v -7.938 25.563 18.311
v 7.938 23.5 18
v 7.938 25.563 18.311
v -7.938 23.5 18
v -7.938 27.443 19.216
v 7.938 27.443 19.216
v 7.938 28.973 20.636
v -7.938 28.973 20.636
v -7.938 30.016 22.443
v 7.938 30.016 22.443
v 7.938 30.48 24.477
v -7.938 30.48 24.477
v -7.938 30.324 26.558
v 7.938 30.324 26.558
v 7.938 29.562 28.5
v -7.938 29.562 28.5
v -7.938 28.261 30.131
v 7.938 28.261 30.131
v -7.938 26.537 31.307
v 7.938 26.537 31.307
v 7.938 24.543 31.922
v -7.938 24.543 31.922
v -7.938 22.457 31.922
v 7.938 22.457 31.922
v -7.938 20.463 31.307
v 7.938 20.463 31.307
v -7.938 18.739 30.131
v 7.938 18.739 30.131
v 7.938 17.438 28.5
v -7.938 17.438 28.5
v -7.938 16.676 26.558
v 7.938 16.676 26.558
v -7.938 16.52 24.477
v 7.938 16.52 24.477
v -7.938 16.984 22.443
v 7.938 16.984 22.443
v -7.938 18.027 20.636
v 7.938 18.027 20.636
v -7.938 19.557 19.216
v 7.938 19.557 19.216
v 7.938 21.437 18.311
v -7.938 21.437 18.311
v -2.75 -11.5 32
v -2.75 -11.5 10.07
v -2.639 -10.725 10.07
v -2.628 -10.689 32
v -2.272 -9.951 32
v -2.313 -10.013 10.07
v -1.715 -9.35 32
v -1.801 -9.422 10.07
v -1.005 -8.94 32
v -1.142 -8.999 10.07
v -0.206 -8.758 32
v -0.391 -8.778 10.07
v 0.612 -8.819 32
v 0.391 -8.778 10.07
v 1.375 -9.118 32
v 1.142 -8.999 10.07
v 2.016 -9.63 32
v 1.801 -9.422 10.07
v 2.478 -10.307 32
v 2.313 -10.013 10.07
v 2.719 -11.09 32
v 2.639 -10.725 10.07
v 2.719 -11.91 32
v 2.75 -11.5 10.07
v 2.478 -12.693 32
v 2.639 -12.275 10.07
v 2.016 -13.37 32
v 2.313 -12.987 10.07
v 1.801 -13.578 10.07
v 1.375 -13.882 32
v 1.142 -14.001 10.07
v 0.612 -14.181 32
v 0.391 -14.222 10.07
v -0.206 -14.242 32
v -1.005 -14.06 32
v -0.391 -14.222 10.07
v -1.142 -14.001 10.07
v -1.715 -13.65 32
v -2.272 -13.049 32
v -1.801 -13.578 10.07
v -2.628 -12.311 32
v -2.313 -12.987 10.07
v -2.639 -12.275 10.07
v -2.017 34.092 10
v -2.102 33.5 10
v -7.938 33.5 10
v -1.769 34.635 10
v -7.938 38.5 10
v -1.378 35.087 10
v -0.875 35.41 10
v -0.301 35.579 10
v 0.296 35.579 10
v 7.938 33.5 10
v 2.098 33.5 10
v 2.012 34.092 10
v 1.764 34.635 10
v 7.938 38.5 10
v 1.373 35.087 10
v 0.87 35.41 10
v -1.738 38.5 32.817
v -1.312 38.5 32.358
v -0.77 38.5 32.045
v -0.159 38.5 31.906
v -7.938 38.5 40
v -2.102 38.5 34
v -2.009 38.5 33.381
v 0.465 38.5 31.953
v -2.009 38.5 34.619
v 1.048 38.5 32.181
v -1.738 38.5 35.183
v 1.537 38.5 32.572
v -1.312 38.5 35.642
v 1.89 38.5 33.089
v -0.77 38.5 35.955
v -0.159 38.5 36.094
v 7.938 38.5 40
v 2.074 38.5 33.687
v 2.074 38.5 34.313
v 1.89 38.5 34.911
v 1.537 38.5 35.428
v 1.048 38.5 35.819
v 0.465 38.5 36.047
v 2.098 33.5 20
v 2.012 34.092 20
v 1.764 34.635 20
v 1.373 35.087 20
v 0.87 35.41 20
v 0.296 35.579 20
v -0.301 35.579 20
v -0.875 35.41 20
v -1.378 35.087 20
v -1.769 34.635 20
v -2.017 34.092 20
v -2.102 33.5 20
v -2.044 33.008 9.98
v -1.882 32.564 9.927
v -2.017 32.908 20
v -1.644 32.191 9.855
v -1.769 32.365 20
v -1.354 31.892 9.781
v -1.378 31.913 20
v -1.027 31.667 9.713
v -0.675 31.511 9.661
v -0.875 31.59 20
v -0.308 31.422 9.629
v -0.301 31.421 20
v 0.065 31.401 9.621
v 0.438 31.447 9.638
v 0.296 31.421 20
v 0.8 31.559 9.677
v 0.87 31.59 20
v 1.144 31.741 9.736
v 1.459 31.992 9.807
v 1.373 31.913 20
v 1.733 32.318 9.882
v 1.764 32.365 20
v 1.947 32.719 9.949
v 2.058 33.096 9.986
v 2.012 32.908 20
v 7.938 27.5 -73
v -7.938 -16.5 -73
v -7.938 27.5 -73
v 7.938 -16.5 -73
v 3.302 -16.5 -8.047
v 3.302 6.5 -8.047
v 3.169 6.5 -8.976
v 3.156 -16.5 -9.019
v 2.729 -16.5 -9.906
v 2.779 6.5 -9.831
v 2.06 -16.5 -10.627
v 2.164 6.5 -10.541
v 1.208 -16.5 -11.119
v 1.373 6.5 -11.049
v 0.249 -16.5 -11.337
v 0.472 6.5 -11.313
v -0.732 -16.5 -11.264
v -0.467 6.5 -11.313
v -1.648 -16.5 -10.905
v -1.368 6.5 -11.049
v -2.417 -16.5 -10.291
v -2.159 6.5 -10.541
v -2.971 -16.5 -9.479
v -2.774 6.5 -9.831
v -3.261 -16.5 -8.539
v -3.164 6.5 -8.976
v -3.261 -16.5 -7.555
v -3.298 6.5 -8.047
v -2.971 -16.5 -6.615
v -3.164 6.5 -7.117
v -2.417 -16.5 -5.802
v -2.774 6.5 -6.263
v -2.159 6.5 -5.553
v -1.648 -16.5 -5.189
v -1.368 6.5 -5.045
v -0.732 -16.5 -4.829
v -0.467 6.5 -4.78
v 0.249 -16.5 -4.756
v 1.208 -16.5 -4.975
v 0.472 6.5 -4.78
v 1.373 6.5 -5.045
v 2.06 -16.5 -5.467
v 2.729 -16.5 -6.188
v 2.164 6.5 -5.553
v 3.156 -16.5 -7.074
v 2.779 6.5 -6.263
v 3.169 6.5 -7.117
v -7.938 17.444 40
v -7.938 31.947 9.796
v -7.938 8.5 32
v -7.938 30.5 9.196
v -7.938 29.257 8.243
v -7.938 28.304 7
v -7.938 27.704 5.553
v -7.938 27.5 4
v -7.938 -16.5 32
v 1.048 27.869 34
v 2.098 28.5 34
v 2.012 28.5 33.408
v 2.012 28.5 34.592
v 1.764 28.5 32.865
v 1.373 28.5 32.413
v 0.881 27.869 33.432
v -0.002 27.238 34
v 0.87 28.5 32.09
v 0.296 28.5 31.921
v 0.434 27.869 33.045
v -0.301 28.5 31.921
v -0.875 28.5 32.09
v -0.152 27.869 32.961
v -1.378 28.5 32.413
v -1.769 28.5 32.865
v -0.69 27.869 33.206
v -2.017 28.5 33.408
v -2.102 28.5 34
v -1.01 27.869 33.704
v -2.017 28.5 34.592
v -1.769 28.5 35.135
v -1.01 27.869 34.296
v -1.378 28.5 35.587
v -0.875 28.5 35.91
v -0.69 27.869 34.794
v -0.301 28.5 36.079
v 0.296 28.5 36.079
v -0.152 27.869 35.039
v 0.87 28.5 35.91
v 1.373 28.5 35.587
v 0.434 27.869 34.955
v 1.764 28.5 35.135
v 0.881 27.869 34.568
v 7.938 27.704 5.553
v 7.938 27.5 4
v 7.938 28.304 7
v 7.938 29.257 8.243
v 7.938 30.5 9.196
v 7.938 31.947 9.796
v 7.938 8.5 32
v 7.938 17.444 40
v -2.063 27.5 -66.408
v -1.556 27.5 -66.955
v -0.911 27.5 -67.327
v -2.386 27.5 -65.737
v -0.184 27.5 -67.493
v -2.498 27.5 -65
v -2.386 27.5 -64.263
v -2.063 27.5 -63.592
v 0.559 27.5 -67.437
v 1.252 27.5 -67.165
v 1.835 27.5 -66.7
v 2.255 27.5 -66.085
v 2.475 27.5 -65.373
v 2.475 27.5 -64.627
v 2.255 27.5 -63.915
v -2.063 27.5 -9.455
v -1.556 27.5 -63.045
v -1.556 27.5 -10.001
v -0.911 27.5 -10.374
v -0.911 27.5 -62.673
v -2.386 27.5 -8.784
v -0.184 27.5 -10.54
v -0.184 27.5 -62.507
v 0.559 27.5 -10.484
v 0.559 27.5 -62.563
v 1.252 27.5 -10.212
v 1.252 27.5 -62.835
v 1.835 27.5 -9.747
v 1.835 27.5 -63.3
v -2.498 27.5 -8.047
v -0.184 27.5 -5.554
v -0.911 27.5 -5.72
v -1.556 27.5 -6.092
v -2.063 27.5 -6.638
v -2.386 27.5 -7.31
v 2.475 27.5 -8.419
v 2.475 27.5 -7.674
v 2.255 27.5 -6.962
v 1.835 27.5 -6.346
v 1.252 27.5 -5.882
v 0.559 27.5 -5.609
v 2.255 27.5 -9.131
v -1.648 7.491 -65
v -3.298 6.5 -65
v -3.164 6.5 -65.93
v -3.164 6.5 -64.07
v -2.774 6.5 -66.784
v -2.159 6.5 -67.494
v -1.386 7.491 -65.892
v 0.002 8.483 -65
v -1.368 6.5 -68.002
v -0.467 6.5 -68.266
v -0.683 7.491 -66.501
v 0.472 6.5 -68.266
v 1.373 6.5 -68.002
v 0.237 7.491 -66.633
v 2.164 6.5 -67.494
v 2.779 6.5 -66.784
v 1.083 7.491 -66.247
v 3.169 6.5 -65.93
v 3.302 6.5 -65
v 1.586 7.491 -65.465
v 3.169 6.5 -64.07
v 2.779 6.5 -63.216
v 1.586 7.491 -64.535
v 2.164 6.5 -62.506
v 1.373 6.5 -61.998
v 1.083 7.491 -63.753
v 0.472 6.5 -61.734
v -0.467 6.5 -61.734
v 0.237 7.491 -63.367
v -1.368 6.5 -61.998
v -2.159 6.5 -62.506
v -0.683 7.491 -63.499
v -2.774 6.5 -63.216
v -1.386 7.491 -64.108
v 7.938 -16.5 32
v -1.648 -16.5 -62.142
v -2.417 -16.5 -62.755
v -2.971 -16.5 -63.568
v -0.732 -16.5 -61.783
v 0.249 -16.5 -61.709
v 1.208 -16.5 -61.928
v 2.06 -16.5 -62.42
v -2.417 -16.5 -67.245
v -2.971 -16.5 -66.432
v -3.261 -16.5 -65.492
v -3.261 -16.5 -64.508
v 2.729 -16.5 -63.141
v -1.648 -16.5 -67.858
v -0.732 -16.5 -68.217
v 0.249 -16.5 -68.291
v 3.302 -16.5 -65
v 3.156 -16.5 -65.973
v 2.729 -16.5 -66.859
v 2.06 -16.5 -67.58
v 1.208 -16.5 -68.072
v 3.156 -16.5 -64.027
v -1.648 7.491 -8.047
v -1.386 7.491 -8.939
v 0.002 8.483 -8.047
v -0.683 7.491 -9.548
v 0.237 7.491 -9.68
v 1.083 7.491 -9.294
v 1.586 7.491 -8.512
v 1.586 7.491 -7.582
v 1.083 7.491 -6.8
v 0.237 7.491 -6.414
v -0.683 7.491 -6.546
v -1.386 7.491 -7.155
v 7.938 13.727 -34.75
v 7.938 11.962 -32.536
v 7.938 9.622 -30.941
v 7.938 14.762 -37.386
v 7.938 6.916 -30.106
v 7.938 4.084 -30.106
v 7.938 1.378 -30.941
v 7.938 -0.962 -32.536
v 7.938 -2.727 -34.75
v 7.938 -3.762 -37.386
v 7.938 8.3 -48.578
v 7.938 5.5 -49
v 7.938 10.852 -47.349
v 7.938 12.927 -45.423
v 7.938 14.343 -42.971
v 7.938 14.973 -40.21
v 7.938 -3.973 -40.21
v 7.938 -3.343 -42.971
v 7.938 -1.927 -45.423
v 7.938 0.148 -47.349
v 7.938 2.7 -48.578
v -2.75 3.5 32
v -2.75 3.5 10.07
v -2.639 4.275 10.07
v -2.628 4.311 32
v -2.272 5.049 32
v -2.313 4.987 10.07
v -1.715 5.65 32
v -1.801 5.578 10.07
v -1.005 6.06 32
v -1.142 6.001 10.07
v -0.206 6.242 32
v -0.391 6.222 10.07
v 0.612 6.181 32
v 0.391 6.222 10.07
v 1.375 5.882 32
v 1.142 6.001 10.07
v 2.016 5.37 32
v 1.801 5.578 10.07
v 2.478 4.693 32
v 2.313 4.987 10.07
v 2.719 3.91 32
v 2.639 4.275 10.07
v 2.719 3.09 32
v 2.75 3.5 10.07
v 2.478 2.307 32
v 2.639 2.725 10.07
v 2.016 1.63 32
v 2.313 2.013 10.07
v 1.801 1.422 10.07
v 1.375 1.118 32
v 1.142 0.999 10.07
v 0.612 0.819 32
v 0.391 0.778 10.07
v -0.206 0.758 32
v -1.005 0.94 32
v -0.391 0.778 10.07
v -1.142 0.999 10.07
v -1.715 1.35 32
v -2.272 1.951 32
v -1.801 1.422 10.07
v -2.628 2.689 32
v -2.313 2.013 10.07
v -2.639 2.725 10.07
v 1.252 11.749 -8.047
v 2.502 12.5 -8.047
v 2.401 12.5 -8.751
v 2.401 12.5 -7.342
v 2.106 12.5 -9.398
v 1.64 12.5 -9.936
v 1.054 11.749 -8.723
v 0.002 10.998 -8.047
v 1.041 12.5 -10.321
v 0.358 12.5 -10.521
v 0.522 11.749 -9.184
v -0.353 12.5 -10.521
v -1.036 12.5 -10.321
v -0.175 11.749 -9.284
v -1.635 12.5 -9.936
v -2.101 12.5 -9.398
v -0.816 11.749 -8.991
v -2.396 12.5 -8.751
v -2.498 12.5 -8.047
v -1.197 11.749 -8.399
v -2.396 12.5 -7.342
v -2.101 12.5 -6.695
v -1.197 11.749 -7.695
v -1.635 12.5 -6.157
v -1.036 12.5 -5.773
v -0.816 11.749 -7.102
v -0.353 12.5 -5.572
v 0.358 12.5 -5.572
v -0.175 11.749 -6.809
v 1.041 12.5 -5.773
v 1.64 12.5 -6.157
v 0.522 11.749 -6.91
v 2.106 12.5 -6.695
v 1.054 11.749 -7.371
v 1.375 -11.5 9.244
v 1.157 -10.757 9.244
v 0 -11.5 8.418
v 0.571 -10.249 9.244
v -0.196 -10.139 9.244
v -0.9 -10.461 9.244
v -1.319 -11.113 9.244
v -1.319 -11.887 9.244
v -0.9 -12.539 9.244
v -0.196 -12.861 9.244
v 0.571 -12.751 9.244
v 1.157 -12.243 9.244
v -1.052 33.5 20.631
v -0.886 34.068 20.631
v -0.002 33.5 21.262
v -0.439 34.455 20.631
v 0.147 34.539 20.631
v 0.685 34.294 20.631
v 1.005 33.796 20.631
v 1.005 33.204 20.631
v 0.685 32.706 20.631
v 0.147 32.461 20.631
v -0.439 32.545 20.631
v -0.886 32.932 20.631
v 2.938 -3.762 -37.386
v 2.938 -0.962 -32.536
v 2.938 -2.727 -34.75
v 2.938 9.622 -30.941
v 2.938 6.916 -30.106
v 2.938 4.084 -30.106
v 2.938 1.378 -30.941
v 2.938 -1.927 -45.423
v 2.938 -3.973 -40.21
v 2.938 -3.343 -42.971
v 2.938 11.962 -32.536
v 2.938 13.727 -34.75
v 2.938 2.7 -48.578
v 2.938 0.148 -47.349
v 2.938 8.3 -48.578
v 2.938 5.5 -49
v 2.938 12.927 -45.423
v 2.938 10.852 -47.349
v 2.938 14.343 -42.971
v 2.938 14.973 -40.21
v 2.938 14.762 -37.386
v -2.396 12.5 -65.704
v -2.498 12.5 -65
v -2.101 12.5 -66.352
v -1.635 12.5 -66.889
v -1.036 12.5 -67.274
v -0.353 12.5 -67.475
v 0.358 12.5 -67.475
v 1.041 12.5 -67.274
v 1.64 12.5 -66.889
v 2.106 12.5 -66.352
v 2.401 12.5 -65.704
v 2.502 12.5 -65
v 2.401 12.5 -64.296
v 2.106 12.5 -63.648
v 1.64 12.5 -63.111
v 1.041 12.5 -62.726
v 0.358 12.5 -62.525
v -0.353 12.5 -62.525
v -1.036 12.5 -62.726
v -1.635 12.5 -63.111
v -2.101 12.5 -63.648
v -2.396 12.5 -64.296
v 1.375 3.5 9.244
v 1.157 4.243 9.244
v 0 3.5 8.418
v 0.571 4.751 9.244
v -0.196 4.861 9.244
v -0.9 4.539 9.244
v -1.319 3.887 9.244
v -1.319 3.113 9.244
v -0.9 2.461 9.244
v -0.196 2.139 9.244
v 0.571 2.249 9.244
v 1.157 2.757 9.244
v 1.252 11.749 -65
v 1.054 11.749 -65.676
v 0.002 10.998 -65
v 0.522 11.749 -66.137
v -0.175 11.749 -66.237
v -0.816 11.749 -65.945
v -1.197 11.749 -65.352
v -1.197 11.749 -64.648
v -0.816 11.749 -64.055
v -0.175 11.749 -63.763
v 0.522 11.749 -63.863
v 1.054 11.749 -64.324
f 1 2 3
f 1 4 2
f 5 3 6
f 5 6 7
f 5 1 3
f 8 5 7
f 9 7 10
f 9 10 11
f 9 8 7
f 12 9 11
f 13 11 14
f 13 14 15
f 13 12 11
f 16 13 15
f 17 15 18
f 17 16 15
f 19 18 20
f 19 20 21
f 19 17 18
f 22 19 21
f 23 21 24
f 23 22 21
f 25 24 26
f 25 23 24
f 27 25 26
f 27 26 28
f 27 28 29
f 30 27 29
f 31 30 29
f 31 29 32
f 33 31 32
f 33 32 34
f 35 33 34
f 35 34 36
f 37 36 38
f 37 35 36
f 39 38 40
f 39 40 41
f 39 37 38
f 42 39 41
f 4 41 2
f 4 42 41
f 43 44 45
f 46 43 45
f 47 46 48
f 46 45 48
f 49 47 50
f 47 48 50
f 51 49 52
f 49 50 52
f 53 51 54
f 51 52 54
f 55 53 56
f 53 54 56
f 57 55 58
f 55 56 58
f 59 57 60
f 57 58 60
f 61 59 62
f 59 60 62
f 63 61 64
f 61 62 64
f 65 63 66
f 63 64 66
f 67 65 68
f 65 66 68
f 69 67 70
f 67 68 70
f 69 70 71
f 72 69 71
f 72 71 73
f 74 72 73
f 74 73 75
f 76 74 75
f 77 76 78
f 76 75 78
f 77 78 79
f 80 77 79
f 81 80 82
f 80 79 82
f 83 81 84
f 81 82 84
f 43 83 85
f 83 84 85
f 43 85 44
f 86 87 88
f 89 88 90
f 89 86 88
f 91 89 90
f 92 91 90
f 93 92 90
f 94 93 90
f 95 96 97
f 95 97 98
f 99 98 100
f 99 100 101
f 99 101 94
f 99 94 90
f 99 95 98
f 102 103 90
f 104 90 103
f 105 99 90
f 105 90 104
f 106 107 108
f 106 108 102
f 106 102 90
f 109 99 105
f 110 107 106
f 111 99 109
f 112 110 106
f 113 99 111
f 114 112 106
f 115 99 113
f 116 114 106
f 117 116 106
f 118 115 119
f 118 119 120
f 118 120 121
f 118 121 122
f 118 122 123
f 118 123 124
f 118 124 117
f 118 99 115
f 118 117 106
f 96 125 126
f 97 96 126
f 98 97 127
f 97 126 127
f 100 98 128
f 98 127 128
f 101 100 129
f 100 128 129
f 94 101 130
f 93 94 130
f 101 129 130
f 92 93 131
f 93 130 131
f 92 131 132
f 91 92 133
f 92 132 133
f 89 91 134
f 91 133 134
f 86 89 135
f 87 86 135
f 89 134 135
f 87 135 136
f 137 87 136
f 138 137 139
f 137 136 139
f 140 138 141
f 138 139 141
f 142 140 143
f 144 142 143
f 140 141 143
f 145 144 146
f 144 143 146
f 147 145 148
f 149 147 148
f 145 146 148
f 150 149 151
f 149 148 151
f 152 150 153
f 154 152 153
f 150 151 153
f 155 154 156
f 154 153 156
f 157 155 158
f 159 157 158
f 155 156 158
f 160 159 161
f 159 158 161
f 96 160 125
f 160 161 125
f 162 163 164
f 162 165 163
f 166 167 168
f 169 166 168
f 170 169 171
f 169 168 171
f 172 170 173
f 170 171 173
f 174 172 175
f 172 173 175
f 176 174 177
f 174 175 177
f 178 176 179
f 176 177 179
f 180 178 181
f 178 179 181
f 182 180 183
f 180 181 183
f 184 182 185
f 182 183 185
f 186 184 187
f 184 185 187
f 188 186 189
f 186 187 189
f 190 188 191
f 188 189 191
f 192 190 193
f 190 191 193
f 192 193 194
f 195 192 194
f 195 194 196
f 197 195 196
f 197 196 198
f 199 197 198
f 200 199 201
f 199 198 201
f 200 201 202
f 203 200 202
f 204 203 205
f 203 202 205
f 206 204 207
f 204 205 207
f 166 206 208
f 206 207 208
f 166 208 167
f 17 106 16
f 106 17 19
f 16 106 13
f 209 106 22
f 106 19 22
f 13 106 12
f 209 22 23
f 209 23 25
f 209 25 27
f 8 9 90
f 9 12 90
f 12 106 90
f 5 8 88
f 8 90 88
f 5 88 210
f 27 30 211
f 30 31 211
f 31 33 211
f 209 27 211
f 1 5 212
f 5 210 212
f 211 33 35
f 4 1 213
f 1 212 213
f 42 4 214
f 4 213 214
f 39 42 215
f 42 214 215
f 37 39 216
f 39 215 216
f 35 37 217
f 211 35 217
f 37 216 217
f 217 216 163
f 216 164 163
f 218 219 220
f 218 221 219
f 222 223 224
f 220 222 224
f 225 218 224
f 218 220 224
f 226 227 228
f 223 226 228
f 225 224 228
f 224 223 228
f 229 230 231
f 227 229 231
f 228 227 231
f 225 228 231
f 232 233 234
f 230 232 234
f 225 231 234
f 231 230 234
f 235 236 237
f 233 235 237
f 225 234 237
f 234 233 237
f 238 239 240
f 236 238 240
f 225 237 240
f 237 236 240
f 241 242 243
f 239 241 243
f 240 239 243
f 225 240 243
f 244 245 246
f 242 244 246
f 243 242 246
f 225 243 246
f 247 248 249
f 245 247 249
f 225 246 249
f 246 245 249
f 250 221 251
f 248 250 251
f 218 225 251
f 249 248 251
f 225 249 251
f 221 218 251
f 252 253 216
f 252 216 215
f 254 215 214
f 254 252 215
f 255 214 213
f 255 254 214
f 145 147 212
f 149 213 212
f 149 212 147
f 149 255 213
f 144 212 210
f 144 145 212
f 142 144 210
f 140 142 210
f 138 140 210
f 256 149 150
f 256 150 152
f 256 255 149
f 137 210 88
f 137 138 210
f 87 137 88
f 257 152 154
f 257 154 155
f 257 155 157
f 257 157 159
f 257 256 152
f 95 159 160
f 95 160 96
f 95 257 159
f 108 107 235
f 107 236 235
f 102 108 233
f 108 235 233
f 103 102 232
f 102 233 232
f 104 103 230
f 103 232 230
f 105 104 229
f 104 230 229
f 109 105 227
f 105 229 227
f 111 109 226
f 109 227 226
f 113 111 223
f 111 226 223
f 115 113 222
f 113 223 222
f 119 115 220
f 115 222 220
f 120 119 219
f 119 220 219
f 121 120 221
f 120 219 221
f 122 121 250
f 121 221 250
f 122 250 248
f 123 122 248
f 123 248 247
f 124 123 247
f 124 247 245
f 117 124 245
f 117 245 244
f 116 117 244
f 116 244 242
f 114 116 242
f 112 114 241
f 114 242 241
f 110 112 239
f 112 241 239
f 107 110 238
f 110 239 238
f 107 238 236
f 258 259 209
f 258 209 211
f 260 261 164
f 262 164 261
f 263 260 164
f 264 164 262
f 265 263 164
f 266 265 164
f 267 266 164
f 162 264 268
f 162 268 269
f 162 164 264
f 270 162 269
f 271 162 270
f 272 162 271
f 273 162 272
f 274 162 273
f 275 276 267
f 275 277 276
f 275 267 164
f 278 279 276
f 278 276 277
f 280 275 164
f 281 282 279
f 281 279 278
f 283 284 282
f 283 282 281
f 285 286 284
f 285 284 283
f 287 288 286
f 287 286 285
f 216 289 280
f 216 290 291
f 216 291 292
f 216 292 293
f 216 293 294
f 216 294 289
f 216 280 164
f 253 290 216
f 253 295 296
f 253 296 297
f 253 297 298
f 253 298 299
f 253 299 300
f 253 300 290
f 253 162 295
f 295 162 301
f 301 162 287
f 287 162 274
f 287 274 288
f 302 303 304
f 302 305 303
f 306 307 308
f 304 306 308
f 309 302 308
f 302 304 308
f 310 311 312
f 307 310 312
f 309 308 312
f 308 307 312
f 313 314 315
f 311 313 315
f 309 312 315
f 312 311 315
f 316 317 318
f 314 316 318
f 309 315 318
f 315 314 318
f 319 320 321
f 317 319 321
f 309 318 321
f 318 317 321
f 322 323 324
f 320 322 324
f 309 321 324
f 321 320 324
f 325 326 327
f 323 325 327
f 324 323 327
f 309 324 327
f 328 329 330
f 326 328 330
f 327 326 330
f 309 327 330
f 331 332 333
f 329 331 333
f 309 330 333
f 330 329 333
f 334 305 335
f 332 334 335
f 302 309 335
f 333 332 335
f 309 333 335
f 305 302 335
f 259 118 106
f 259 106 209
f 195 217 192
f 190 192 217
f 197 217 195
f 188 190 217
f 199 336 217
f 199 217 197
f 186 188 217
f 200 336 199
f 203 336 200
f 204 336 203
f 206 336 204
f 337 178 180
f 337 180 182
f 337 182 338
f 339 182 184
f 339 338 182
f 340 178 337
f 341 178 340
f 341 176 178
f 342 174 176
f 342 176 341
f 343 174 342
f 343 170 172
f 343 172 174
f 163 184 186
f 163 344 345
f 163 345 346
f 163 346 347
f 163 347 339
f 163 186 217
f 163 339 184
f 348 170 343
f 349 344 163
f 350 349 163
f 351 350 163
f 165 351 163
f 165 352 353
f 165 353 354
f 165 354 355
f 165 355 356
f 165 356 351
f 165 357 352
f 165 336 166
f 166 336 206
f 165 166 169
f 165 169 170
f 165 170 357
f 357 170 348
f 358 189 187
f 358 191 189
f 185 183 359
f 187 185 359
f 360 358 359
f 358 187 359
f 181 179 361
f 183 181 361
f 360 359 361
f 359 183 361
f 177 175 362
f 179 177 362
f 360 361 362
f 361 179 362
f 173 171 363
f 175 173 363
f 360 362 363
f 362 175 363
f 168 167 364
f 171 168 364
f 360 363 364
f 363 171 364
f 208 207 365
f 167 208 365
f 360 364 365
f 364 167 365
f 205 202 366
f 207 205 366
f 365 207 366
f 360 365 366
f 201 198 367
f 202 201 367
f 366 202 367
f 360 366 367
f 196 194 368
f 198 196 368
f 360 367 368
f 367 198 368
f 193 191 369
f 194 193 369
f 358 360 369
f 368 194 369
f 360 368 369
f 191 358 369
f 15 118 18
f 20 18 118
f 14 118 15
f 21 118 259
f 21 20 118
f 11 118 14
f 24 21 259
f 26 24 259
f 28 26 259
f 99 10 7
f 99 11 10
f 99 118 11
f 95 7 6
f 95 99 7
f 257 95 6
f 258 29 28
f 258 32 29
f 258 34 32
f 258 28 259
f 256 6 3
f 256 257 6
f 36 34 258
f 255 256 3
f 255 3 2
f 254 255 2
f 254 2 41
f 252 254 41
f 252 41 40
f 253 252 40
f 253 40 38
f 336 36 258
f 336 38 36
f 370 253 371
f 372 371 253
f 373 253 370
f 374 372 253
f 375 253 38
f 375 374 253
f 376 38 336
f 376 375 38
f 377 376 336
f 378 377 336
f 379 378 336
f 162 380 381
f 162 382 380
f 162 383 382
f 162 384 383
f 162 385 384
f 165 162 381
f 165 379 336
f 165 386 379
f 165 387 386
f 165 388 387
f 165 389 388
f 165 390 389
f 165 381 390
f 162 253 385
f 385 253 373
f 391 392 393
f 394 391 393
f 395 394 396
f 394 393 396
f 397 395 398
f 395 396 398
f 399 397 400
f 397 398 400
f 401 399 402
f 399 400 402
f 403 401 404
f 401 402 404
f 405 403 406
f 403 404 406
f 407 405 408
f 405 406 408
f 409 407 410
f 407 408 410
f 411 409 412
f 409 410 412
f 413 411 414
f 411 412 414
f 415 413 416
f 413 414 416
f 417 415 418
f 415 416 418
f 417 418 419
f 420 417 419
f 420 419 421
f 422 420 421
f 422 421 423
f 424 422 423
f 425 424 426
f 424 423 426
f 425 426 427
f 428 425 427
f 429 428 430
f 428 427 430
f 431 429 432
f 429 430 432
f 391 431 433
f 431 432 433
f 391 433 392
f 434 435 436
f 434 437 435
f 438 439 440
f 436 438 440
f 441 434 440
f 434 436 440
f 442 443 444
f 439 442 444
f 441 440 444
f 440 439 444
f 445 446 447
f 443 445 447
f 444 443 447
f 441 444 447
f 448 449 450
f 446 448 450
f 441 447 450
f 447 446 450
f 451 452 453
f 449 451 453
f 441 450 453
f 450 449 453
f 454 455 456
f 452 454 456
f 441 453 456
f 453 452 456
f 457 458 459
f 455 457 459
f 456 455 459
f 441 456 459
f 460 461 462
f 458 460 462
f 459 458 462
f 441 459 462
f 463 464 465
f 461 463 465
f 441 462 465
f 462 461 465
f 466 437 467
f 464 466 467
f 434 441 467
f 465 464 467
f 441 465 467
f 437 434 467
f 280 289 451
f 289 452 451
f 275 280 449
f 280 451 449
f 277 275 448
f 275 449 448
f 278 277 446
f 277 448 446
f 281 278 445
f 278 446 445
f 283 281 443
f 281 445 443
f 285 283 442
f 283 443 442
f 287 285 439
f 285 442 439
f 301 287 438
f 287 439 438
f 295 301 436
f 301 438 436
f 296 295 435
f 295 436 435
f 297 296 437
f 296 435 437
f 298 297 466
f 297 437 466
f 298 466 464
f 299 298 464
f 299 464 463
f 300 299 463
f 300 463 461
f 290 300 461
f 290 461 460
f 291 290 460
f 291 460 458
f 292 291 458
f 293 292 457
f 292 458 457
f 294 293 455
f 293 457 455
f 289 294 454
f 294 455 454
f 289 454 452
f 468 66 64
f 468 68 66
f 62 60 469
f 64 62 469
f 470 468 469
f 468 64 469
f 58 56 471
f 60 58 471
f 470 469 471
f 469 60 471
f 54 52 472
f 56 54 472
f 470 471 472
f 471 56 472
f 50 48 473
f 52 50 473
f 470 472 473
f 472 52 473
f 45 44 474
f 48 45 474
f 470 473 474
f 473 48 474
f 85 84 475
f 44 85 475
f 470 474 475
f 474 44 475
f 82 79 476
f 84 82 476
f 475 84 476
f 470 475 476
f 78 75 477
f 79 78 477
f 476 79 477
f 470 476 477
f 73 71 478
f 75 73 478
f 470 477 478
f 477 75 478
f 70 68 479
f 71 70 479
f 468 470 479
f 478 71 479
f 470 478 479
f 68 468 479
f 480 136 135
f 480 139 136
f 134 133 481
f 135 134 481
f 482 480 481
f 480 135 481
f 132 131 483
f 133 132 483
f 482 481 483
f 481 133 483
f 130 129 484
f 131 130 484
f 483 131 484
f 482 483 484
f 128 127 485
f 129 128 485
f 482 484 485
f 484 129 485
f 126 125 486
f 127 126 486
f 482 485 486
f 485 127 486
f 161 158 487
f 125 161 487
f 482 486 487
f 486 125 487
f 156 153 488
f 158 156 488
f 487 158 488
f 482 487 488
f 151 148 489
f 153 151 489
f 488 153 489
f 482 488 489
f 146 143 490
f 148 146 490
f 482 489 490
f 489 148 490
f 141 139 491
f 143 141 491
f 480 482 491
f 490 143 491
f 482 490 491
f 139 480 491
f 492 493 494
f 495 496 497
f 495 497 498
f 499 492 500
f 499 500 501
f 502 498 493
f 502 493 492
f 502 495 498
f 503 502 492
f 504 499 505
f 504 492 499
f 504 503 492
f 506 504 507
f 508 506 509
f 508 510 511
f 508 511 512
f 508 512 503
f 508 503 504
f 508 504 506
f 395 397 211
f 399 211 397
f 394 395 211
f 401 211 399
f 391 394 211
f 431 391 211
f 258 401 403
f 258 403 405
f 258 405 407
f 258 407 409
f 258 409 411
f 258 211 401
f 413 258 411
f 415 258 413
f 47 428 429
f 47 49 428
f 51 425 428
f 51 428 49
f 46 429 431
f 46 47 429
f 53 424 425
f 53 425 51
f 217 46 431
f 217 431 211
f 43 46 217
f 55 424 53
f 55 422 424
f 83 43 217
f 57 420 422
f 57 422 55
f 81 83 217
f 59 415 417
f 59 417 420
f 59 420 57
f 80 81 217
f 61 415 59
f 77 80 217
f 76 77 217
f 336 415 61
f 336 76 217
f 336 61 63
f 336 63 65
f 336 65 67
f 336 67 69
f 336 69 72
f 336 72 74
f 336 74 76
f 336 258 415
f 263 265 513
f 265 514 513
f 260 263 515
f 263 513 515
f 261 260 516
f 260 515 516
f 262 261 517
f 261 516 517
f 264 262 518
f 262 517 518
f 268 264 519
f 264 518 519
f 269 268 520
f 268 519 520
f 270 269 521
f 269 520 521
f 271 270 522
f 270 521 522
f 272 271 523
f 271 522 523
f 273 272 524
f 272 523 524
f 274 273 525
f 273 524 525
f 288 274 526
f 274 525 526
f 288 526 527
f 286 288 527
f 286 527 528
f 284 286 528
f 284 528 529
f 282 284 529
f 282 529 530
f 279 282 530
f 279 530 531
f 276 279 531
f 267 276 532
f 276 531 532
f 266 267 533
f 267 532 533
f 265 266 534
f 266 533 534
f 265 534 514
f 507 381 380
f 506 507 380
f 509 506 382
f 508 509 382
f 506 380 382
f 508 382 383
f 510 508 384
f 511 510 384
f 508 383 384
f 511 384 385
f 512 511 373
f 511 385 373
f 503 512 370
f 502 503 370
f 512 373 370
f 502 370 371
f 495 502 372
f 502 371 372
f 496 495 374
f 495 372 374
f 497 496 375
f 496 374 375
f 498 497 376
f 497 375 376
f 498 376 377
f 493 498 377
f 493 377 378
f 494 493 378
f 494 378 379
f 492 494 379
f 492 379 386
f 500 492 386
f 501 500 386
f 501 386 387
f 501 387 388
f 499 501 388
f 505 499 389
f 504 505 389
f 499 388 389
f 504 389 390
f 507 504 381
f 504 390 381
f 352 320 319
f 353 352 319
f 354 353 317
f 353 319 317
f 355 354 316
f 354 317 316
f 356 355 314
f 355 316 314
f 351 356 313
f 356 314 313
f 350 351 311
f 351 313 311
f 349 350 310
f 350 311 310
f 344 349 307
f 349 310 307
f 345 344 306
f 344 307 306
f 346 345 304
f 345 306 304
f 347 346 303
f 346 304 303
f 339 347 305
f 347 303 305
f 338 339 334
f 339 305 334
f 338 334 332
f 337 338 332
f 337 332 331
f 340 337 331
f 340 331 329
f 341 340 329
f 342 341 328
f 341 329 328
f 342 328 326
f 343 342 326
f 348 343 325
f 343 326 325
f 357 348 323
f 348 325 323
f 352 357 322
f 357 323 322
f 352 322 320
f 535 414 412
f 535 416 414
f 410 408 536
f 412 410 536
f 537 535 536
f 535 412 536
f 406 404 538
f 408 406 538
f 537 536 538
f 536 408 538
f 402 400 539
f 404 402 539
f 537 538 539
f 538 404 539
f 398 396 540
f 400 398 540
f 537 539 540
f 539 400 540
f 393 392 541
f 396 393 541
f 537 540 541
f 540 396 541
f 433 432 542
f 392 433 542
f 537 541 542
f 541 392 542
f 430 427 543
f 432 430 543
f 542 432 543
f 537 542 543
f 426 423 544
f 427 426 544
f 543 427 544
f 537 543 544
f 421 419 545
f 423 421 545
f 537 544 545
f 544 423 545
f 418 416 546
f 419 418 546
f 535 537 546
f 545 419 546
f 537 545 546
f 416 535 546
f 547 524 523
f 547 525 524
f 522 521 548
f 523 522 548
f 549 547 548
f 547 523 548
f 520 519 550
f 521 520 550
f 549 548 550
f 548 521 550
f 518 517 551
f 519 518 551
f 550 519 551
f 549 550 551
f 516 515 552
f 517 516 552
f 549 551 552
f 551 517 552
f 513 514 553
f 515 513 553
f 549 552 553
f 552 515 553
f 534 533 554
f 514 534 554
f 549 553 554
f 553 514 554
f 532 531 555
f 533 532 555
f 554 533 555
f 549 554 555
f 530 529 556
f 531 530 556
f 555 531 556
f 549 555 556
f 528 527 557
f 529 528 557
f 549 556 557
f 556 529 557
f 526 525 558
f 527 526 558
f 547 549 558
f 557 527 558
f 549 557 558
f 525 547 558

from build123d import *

# Parameters (mm, degrees)
ESBO_O1_R                                            = 7
RESSALTO_EXTRUS_O1_DEPTH                             = 7.9375
ESCAREADO_PARA_PARAFUSO_DE_M_QUINA_COM_C_D           = 5.5
ESCAREADO_PARA_PARAFUSO_DE_M_QUINA_COM_C_DEPTH       = 30
ESCAREADO_PARA_PARAFUSO_DE_M_QUINA_COM_C_CSINK_D     = 10.4
ESCAREADO_PARA_PARAFUSO_DE_M_QUINA_COM_C_CSINK_ANGLE = 90
ESCAREADO_PARA_PARAFUSO_DE_M_QUINA_COM_C_TIP         = 1.652366702
ESCAREADO_PARA_PARAFUSO_DE_M_QUINA_C_2_D             = 6.6
ESCAREADO_PARA_PARAFUSO_DE_M_QUINA_C_2_DEPTH         = 30
ESCAREADO_PARA_PARAFUSO_DE_M_QUINA_C_2_CSINK_D       = 12.6
ESCAREADO_PARA_PARAFUSO_DE_M_QUINA_C_2_CSINK_ANGLE   = 90
ESCAREADO_PARA_PARAFUSO_DE_M_QUINA_C_2_TIP           = 1.982840043
BROCA_DE_ROSQUEAR_PARA_TARRAXA_DE_M5X0_8_D           = 4.2
BROCA_DE_ROSQUEAR_PARA_TARRAXA_DE_M5X0_8_DEPTH       = 20
BROCA_DE_ROSQUEAR_PARA_TARRAXA_DE_M5X0_8_TIP         = 1.2618073
BROCA_DE_ROSQUEAR_PARA_TARRAXA_DE_M5_2_D             = 4.2
BROCA_DE_ROSQUEAR_PARA_TARRAXA_DE_M5_2_DEPTH         = 20
BROCA_DE_ROSQUEAR_PARA_TARRAXA_DE_M5_2_TIP           = 1.2618073
BROCA_DE_ROSQUEAR_PARA_TARRAXA_DE_M6X1_0_D           = 5
BROCA_DE_ROSQUEAR_PARA_TARRAXA_DE_M6X1_0_DEPTH       = 15
BROCA_DE_ROSQUEAR_PARA_TARRAXA_DE_M6X1_0_TIP         = 1.502151548
FILLET1_R                                            = 6
SKETCH7_R                                            = 9.5
CUT_EXTRUDE4_DEPTH                                   = 5


with BuildPart() as part:
    # Esboço1 → Ressalto-extrusão1 (new, symmetric)
    with BuildSketch(Plane(origin=(0, 0, 0), x_dir=(0, 0, -1), z_dir=(1, 0, 0))):
        Polygon((-10, 38.5), (-40, 38.5), (-40, 23.5), (-40, 17.44427191), (-32, 8.5), (-32, -16.5), (73, -16.5), (73, 27.5), (-10, 27.5), align=None)
        with Locations((-25, 23.5)):
            Circle(ESBO_O1_R, mode=Mode.SUBTRACT)
    extrude(amount=RESSALTO_EXTRUS_O1_DEPTH, both=True)

    # Escareado para parafuso de m_quina com c
    with Locations(Plane(origin=(33.0625, -10.251665499, 40.070399895), x_dir=(1, 0, 0), z_dir=(0, 0, 1))):
        with Locations((-33.0625, 13.751665499), (-33.0625, -1.248334501), (33.0625, -1.248334501), (33.0625, 13.751665499)):
            CounterSinkHole(ESCAREADO_PARA_PARAFUSO_DE_M_QUINA_COM_C_D / 2, ESCAREADO_PARA_PARAFUSO_DE_M_QUINA_COM_C_CSINK_D / 2, depth=ESCAREADO_PARA_PARAFUSO_DE_M_QUINA_COM_C_DEPTH, counter_sink_angle=ESCAREADO_PARA_PARAFUSO_DE_M_QUINA_COM_C_CSINK_ANGLE)
            with Locations((0, 0, -(ESCAREADO_PARA_PARAFUSO_DE_M_QUINA_COM_C_DEPTH + ESCAREADO_PARA_PARAFUSO_DE_M_QUINA_COM_C_TIP / 2))):  # 118° drill point
                Cone(0, ESCAREADO_PARA_PARAFUSO_DE_M_QUINA_COM_C_D / 2, ESCAREADO_PARA_PARAFUSO_DE_M_QUINA_COM_C_TIP, mode=Mode.SUBTRACT)

    # Escareado para parafuso de m_quina c 2
    with Locations(Plane(origin=(33.0625, -23.5, -11.460196829), x_dir=(-1, 0, 0), z_dir=(0, -1, 0))):
        with Locations((33.06, 53.539803171), (33.06, -3.413475694), (-33.06, -3.413475694), (-33.06, 49.586524306)):
            CounterSinkHole(ESCAREADO_PARA_PARAFUSO_DE_M_QUINA_C_2_D / 2, ESCAREADO_PARA_PARAFUSO_DE_M_QUINA_C_2_CSINK_D / 2, depth=ESCAREADO_PARA_PARAFUSO_DE_M_QUINA_C_2_DEPTH, counter_sink_angle=ESCAREADO_PARA_PARAFUSO_DE_M_QUINA_C_2_CSINK_ANGLE)
            with Locations((0, 0, -(ESCAREADO_PARA_PARAFUSO_DE_M_QUINA_C_2_DEPTH + ESCAREADO_PARA_PARAFUSO_DE_M_QUINA_C_2_TIP / 2))):  # 118° drill point
                Cone(0, ESCAREADO_PARA_PARAFUSO_DE_M_QUINA_C_2_D / 2, ESCAREADO_PARA_PARAFUSO_DE_M_QUINA_C_2_TIP, mode=Mode.SUBTRACT)

    # Broca de rosquear para tarraxa de M5x0.8
    with Locations(Plane(origin=(33.0625, 48.5, -11.460196829), x_dir=(1, 0, 0), z_dir=(0, 1, 0))):
        with Locations((33.06, -45.460196829), (-33.065, -45.460196829)):
            Hole(BROCA_DE_ROSQUEAR_PARA_TARRAXA_DE_M5X0_8_D / 2, depth=BROCA_DE_ROSQUEAR_PARA_TARRAXA_DE_M5X0_8_DEPTH)
            with Locations((0, 0, -(BROCA_DE_ROSQUEAR_PARA_TARRAXA_DE_M5X0_8_DEPTH + BROCA_DE_ROSQUEAR_PARA_TARRAXA_DE_M5X0_8_TIP / 2))):  # 118° drill point
                Cone(0, BROCA_DE_ROSQUEAR_PARA_TARRAXA_DE_M5X0_8_D / 2, BROCA_DE_ROSQUEAR_PARA_TARRAXA_DE_M5X0_8_TIP, mode=Mode.SUBTRACT)

    # Broca de rosquear para tarraxa de M5 2
    with Locations(Plane(origin=(33.0625, -10.251665499, 0), x_dir=(-1, 0, 0), z_dir=(0, 0, -1))):
        with Locations((-33.06, 43.751665499), (33.065, 43.751665499)):
            Hole(BROCA_DE_ROSQUEAR_PARA_TARRAXA_DE_M5_2_D / 2, depth=BROCA_DE_ROSQUEAR_PARA_TARRAXA_DE_M5_2_DEPTH)
            with Locations((0, 0, -(BROCA_DE_ROSQUEAR_PARA_TARRAXA_DE_M5_2_DEPTH + BROCA_DE_ROSQUEAR_PARA_TARRAXA_DE_M5_2_TIP / 2))):  # 118° drill point
                Cone(0, BROCA_DE_ROSQUEAR_PARA_TARRAXA_DE_M5_2_D / 2, BROCA_DE_ROSQUEAR_PARA_TARRAXA_DE_M5_2_TIP, mode=Mode.SUBTRACT)

    # Broca de rosquear para tarraxa de M6x1.01
    with Locations(Plane(origin=(33.0625, 27.5, -11.460196829), x_dir=(1, 0, 0), z_dir=(0, 1, 0))):
        with Locations((33.06, 49.539803171), (-33.06, 53.539803171), (-33.06, -3.413475694), (33.06, -3.413475694)):
            Hole(BROCA_DE_ROSQUEAR_PARA_TARRAXA_DE_M6X1_0_D / 2, depth=BROCA_DE_ROSQUEAR_PARA_TARRAXA_DE_M6X1_0_DEPTH)
            with Locations((0, 0, -(BROCA_DE_ROSQUEAR_PARA_TARRAXA_DE_M6X1_0_DEPTH + BROCA_DE_ROSQUEAR_PARA_TARRAXA_DE_M6X1_0_TIP / 2))):  # 118° drill point
                Cone(0, BROCA_DE_ROSQUEAR_PARA_TARRAXA_DE_M6X1_0_D / 2, BROCA_DE_ROSQUEAR_PARA_TARRAXA_DE_M6X1_0_TIP, mode=Mode.SUBTRACT)

    # Fillet1
    # the kernel refuses this fillet: 6 mm, written as the material it adds along each edge
    with BuildSketch(Plane(origin=(7.9375, 27.5, 10), x_dir=(0, 1, 0), z_dir=(-1, 0, 0))) as fillet1_piece_1_section:
        with BuildLine():
            CenterArc((FILLET1_R, FILLET1_R), FILLET1_R, 180, 90)
            Line((0, FILLET1_R), (0, 0))
            Line((0, 0), (FILLET1_R, 0))
        make_face()
    fillet1_piece_1 = extrude(amount=15.875, mode=Mode.PRIVATE)
    fillet1_piece_1 = fillet1_piece_1 - Plane(origin=(-0.0025, 33.5, 8.627789353), x_dir=(1, 0, 0), z_dir=(0, 0, 1)) * Cylinder(2.1, 56, mode=Mode.PRIVATE)
    add(fillet1_piece_1)

    # Sketch7 → Cut-Extrude4 (cut)
    with BuildSketch(Plane(origin=(7.9375, 0, 0), x_dir=(0, 0, -1), z_dir=(1, 0, 0))):
        with Locations((39.5, 5.5)):
            Circle(SKETCH7_R)
    extrude(amount=-CUT_EXTRUDE4_DEPTH, mode=Mode.SUBTRACT)


solid = part.part
